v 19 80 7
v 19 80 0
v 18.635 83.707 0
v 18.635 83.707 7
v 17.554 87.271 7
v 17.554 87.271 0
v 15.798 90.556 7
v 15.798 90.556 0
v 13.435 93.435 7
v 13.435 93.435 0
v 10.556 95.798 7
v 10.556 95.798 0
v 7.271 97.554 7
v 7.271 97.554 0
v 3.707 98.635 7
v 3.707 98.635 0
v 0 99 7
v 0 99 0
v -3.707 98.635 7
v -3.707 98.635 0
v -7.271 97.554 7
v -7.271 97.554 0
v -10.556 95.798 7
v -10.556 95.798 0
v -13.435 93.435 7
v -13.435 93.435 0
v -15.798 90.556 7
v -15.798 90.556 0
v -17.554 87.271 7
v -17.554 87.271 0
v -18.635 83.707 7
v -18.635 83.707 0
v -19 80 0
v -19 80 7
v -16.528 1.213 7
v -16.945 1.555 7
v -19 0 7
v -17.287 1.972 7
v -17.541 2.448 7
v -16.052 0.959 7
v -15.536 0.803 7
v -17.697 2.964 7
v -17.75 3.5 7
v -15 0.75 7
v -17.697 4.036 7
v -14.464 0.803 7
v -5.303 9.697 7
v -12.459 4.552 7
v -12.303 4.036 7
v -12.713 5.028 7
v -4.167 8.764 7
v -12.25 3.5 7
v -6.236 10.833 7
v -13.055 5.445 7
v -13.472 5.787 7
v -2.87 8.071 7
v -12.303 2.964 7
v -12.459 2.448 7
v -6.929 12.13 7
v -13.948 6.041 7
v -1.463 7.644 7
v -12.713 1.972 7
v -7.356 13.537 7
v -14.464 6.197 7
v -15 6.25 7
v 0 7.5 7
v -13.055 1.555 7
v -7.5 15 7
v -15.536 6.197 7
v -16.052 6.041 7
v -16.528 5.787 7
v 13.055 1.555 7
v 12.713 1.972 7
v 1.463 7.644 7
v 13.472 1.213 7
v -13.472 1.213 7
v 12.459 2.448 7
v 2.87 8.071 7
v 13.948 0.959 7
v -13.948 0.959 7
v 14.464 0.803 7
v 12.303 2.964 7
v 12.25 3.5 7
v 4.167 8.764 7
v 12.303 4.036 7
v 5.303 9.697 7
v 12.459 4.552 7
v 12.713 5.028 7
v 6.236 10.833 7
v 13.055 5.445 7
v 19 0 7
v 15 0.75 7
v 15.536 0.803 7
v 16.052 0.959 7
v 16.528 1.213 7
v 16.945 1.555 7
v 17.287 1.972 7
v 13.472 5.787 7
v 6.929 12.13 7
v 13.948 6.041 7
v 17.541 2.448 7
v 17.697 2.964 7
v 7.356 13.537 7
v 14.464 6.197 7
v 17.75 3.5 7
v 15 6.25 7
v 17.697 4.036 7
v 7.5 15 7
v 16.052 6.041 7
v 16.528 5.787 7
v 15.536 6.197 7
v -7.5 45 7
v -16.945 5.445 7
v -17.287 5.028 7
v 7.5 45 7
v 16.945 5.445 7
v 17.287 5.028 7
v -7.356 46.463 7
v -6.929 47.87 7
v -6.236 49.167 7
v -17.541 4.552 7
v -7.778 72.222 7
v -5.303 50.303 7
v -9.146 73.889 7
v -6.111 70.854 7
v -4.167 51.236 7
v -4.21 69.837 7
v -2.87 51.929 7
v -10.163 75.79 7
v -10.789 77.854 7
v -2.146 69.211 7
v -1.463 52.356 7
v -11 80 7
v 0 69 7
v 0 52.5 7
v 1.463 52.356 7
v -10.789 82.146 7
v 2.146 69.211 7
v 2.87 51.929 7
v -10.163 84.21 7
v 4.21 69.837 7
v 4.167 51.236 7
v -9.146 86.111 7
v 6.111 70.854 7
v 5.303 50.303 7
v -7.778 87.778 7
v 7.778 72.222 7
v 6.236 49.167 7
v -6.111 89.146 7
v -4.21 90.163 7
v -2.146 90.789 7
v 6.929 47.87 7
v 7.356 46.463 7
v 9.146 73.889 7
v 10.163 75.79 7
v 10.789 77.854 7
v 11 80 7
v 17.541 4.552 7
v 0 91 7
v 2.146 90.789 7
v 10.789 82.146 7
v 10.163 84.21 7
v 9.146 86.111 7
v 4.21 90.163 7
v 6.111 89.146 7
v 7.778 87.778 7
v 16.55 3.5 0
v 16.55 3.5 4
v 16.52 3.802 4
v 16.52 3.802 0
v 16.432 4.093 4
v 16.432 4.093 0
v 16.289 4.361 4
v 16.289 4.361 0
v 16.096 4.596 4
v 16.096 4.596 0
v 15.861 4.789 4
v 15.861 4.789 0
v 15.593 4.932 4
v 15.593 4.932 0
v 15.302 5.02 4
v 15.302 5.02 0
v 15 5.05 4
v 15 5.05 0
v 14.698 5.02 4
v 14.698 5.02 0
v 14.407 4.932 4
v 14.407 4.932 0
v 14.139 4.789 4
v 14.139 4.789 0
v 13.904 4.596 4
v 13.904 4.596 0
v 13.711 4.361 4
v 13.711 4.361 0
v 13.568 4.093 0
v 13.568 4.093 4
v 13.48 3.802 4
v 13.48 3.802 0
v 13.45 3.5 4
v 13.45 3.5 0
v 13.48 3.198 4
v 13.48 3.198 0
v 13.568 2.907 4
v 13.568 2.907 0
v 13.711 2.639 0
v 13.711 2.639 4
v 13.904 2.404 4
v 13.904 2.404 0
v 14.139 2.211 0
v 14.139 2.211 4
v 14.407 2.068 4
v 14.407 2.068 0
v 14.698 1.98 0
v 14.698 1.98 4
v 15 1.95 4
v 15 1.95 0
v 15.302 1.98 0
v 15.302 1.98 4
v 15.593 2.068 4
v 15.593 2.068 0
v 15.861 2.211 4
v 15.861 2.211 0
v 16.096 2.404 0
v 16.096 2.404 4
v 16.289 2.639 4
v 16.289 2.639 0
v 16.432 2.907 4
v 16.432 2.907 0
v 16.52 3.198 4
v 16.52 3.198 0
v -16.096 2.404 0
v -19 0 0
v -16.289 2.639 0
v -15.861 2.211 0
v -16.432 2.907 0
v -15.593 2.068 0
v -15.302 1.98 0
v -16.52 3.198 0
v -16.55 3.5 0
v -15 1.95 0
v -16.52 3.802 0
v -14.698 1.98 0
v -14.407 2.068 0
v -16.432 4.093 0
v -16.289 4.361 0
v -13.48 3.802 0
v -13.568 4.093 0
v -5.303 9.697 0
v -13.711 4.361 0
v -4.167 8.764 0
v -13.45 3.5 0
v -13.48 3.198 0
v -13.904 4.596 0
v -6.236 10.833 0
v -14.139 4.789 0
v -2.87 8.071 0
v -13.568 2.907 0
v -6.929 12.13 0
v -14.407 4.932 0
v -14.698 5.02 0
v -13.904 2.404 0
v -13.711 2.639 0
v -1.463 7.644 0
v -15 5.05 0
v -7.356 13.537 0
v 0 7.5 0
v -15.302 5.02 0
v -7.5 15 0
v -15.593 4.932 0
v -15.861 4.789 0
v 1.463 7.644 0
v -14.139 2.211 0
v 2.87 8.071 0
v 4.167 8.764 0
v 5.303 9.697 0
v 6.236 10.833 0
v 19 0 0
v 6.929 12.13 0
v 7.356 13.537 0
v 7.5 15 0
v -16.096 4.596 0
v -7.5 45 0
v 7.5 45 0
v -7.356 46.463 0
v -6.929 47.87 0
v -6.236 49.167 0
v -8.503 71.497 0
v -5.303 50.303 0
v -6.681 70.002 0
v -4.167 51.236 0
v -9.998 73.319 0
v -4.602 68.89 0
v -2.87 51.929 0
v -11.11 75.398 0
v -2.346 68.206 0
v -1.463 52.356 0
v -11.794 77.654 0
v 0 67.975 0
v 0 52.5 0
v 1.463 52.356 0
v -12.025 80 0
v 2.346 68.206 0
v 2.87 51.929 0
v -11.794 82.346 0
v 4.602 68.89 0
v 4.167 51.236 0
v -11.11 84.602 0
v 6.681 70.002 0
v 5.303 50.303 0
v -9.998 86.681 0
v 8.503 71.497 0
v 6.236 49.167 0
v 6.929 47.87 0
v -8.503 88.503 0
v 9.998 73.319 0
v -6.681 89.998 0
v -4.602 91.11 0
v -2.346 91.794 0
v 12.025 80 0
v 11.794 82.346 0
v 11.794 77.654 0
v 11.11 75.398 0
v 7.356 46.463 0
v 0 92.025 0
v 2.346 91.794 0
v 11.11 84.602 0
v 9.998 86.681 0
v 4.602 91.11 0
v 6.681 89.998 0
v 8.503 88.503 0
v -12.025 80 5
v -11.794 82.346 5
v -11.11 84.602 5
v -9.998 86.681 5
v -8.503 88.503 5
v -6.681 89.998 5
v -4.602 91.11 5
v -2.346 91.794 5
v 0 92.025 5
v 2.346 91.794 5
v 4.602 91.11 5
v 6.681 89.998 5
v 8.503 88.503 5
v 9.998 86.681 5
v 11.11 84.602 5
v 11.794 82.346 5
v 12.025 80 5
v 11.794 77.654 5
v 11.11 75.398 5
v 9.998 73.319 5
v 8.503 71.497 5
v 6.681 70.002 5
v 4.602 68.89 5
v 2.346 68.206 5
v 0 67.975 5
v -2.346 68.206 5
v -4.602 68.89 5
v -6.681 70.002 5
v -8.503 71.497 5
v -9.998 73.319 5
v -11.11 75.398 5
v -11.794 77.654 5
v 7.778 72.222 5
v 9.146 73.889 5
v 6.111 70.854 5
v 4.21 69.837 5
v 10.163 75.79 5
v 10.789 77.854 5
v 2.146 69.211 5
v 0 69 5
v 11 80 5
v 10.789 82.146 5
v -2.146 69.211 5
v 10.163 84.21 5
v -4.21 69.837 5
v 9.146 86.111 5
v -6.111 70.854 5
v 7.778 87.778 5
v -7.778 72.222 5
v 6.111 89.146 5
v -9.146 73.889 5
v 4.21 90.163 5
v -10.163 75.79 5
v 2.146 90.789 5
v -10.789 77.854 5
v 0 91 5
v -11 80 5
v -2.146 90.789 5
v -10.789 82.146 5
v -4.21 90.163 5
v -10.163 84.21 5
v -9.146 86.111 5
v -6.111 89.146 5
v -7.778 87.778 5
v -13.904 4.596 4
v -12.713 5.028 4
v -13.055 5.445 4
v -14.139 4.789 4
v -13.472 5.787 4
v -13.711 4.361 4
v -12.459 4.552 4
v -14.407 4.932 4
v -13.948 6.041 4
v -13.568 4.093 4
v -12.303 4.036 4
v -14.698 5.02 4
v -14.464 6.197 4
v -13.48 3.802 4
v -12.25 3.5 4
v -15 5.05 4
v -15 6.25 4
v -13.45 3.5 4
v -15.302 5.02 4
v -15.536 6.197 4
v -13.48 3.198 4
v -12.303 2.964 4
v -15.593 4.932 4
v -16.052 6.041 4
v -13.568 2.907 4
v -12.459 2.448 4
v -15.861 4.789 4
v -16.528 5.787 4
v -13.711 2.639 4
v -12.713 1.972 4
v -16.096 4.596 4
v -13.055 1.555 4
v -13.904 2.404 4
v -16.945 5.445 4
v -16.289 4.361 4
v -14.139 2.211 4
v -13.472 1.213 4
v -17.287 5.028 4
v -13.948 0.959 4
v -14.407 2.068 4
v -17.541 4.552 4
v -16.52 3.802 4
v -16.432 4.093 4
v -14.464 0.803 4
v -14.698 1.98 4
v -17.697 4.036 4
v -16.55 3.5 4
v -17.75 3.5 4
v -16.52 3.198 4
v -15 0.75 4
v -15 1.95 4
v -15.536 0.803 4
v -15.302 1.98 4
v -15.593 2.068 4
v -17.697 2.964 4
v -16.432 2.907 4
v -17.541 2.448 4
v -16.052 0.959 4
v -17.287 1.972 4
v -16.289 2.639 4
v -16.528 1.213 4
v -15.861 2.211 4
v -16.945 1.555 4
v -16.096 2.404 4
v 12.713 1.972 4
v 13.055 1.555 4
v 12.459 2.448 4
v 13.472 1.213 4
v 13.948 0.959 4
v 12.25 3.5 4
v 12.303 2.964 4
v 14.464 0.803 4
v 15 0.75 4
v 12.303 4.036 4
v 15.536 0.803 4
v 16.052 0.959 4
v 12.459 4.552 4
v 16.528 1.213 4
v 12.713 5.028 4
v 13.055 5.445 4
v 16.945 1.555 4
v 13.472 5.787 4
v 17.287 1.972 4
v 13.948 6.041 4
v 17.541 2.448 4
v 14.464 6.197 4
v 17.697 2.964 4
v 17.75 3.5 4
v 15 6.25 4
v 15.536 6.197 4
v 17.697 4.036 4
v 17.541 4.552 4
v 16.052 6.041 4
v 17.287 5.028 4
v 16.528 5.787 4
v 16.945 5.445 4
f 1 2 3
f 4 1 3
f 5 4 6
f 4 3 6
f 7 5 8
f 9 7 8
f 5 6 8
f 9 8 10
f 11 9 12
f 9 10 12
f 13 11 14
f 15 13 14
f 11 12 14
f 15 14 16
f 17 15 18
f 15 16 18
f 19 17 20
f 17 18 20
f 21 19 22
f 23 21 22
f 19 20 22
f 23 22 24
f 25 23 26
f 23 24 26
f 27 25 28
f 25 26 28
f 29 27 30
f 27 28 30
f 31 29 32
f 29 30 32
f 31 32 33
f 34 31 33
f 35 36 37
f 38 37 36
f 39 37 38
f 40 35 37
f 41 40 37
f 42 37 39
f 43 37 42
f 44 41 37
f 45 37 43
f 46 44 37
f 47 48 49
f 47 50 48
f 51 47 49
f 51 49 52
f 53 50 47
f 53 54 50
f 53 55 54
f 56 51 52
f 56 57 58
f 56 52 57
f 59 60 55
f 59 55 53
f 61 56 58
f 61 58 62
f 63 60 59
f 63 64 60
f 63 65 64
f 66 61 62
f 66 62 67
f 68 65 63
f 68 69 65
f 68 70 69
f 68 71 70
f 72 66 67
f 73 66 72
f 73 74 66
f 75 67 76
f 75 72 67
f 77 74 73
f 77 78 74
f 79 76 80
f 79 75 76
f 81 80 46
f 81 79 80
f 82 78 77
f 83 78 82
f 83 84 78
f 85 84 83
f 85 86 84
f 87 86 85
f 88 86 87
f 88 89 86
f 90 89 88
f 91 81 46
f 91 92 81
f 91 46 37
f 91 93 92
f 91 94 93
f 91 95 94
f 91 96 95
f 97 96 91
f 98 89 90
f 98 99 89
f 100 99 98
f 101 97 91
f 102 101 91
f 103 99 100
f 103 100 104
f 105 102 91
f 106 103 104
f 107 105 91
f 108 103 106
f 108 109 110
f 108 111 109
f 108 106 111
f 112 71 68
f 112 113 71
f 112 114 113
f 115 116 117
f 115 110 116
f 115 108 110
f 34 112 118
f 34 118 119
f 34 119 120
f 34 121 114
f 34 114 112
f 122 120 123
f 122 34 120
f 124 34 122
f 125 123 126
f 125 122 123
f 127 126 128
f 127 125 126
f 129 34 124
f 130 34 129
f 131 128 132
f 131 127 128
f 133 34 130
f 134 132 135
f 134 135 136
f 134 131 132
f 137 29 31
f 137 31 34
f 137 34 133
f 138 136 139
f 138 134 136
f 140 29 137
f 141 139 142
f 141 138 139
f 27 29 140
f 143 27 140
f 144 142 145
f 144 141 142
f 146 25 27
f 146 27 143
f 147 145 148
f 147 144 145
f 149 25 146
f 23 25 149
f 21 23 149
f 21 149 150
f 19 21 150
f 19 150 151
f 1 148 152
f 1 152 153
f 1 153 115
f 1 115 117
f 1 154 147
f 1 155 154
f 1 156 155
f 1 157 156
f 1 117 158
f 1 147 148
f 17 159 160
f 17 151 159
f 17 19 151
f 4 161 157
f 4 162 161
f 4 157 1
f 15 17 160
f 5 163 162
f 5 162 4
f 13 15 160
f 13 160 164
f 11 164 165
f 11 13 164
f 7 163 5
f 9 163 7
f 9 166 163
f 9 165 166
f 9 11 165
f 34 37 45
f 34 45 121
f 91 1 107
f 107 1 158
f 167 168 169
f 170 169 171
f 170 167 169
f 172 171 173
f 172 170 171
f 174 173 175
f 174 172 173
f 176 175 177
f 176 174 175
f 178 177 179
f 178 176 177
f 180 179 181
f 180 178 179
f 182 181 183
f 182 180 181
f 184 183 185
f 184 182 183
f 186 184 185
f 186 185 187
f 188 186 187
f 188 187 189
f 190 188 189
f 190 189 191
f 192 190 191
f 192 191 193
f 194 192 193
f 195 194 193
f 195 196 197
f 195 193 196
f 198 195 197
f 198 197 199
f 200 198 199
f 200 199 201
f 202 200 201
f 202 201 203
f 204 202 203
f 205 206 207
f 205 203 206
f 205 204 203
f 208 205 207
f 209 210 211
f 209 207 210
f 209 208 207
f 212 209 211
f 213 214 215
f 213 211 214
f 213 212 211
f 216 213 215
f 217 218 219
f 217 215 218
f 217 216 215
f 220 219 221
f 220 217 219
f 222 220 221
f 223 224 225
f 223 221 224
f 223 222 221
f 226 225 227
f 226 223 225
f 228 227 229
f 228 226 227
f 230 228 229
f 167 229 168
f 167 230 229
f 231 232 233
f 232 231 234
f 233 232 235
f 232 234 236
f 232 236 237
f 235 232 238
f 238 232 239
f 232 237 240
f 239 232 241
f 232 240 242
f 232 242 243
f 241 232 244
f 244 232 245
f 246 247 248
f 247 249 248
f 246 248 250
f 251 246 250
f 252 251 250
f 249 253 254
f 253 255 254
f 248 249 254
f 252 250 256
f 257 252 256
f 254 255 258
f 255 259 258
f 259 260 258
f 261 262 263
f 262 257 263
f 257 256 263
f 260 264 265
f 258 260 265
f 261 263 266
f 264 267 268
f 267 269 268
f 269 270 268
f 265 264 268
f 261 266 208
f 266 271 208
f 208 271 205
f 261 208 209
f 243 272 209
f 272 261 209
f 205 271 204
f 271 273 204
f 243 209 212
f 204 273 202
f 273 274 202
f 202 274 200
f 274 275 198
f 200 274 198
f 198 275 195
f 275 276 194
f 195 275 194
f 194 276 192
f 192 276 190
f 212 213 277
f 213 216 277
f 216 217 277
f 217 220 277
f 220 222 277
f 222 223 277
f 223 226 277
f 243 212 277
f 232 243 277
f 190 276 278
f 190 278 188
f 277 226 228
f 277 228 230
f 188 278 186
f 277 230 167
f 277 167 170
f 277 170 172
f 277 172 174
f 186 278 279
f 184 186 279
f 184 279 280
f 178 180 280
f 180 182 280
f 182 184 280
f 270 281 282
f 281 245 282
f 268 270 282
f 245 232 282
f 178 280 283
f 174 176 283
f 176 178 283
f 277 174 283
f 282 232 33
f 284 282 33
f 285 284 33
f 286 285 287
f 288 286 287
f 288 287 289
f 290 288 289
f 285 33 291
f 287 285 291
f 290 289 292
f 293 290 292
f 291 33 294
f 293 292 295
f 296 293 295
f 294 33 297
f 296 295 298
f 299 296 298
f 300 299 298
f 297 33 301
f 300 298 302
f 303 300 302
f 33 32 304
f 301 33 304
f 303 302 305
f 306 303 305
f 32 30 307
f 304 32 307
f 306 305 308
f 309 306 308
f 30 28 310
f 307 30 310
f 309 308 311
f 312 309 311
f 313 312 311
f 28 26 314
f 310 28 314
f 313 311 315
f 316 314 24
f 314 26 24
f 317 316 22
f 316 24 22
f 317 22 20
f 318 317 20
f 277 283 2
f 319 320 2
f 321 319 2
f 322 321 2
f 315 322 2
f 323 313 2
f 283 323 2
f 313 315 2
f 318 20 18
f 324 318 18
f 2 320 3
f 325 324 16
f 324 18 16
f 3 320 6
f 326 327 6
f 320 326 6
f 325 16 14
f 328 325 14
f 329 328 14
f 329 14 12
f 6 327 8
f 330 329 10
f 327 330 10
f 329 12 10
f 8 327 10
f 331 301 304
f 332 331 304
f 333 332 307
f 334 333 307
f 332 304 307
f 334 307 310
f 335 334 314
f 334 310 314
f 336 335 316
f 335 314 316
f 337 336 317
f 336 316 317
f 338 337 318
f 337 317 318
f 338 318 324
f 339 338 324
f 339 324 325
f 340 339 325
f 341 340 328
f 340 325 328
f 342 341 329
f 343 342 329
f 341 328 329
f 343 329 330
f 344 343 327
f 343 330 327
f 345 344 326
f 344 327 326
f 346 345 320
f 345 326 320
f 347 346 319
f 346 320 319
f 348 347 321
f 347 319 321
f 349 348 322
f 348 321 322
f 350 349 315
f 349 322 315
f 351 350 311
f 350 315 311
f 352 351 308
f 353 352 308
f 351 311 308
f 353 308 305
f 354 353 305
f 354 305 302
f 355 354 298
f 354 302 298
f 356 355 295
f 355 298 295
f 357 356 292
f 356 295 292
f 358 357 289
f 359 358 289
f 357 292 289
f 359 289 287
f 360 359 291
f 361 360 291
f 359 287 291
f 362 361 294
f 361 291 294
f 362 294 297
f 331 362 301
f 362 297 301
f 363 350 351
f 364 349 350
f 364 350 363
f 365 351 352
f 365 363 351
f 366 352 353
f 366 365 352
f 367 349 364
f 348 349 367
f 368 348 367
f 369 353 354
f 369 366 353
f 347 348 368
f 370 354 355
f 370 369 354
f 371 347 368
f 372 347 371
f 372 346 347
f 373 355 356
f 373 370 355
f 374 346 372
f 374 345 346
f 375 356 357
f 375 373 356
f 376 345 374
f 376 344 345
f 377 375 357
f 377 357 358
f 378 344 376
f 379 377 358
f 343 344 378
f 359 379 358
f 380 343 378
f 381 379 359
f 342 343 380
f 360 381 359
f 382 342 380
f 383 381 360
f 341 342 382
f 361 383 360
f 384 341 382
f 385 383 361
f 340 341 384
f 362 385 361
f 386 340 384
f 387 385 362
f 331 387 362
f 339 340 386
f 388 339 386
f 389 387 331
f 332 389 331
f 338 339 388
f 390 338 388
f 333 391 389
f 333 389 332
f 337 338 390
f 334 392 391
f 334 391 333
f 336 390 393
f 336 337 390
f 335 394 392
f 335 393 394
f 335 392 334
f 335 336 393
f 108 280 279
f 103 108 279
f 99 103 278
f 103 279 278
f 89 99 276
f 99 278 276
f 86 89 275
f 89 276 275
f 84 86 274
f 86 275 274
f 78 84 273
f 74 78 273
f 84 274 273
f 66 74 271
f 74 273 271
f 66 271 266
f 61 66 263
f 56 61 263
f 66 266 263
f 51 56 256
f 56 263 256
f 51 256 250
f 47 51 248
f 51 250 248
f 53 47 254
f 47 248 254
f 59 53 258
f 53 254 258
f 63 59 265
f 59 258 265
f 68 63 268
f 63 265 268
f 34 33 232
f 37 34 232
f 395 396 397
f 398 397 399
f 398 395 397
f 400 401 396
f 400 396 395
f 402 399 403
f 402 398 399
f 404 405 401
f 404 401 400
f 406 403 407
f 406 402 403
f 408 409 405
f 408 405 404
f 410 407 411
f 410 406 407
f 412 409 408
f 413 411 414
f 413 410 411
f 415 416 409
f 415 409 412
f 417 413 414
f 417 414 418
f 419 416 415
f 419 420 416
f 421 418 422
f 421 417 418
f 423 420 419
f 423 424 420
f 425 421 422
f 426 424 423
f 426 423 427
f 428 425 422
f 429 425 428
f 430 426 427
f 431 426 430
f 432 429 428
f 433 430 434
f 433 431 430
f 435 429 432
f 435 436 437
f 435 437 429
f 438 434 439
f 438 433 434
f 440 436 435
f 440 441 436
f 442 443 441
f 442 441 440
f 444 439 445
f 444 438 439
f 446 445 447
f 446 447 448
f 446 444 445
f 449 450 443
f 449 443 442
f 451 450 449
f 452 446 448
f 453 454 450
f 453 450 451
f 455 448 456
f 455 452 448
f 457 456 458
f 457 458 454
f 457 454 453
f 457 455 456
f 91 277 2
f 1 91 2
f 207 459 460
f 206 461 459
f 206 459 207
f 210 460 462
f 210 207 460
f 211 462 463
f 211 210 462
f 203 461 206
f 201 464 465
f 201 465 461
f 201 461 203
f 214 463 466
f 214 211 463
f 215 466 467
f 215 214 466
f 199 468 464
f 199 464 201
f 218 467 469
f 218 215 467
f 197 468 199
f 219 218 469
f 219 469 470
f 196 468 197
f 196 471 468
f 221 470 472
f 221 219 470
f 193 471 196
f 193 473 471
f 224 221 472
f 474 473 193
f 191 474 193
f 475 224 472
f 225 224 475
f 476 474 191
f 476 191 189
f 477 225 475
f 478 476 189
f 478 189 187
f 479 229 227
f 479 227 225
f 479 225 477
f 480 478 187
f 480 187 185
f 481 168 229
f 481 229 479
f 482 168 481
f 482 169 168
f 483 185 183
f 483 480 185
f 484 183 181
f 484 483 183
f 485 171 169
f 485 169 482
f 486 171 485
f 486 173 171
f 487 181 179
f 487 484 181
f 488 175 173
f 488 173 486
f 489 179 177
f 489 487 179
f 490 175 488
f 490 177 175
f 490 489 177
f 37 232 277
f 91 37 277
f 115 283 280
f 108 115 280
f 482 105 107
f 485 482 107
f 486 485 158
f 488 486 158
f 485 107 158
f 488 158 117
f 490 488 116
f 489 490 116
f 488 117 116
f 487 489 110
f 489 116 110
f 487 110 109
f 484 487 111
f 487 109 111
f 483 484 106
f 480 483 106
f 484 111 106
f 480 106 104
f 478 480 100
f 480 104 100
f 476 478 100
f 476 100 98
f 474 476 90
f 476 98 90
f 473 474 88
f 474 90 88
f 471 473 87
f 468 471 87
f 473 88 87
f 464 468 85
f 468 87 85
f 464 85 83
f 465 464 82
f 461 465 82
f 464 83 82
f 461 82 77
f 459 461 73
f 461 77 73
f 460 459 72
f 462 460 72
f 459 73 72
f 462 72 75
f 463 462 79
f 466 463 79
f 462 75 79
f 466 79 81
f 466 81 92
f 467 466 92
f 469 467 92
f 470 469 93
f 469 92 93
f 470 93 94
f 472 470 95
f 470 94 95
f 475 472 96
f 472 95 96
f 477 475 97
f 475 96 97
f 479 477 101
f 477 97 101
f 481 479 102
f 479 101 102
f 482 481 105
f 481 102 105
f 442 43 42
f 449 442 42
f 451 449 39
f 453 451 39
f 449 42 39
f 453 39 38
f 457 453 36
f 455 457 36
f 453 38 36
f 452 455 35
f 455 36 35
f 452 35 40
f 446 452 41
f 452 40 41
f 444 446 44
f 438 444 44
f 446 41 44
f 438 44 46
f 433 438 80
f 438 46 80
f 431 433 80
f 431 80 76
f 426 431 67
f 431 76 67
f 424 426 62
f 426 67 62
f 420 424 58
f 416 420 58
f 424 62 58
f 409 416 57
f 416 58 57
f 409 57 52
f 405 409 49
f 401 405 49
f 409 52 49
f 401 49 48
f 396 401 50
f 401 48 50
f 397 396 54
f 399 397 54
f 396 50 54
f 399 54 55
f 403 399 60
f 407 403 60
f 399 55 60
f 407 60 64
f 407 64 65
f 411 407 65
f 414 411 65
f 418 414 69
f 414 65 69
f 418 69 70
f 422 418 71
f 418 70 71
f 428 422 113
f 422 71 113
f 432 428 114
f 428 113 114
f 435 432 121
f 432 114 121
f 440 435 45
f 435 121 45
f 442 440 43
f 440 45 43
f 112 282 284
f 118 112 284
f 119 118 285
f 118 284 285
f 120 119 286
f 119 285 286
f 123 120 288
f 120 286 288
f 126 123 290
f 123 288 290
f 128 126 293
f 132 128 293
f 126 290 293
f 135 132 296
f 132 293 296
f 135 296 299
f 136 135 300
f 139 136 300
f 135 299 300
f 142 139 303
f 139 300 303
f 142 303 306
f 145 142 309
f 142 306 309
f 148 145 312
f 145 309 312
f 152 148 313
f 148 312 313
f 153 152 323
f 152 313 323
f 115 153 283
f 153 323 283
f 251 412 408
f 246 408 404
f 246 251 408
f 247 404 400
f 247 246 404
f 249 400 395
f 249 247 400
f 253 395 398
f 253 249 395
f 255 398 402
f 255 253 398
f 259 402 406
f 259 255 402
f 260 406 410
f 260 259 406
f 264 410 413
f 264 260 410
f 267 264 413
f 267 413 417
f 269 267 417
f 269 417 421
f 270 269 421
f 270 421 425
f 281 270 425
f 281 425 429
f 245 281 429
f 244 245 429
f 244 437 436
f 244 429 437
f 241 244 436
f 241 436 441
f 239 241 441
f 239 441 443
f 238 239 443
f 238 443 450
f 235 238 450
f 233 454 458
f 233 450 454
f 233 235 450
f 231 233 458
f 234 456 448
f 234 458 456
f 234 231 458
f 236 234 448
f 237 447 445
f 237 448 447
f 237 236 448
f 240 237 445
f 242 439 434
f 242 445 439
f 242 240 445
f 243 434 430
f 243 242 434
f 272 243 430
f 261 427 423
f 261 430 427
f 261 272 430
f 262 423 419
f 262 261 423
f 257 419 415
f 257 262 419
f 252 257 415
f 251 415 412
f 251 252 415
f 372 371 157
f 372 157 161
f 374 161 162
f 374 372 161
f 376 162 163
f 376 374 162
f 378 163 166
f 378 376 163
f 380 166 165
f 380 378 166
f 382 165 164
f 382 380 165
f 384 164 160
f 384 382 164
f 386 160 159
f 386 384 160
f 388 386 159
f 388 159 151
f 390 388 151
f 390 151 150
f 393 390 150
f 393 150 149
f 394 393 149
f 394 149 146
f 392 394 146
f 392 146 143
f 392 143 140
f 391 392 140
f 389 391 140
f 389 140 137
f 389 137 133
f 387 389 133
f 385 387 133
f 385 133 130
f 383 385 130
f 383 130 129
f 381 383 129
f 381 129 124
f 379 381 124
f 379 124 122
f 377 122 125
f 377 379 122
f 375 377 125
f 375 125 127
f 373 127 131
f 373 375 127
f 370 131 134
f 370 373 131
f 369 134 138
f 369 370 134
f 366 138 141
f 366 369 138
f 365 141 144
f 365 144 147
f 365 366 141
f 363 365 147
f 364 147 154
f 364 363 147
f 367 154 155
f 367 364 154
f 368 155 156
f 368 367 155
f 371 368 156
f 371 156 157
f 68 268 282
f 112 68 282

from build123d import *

# Parameters (mm, degrees)
SKETCH_1_R         = 11
SKETCH_1_R_2       = 1.55
SKETCH_1_R_3       = 19
EXTRUDE_1_DEPTH    = 7
SKETCH1_R          = 2.75
CUT_EXTRUDE1_DEPTH = 3
SKETCH2_R          = 12.025
CUT_EXTRUDE2_DEPTH = 5


with BuildPart() as part:
    # 草图1 → 凸台-拉伸1 (new body)
    # profile 1 of 3: a face of its own
    with BuildSketch(Plane.XY):
        with BuildLine():
            ThreePointArc((19, 80), (0, 99), (-19, 80))
            ThreePointArc((-19, 80), (0, 61), (19, 80))
        make_face()
        with Locations((0, 80)):
            Circle(SKETCH_1_R, mode=Mode.SUBTRACT)
    # profile 2 of 3: a face of its own
    with BuildSketch(Plane.XY):
        with BuildLine():
            Line((-19, 7), (-19, 0))
            Line((-19, 0), (19, 0))
            Line((19, 0), (19, 7))
            Line((19, 7), (19, 80))
            ThreePointArc((19, 80), (0, 61), (-19, 80))
            Line((-19, 80), (-19, 7))
        make_face()
        with Locations((-15, 3.5)):
            Circle(SKETCH_1_R_2, mode=Mode.SUBTRACT)
        with BuildLine():
            ThreePointArc((-7.5, 45), (0, 52.5), (7.5, 45))
            Line((7.5, 45), (7.5, 15))
            ThreePointArc((7.5, 15), (0, 7.5), (-7.5, 15))
            Line((-7.5, 15), (-7.5, 45))
        make_face(mode=Mode.SUBTRACT)
        with Locations((15, 3.5)):
            Circle(SKETCH_1_R_2, mode=Mode.SUBTRACT)
    # profile 3 of 3: a face of its own
    with BuildSketch(Plane.XY):
        with Locations((0, 80)):
            Circle(SKETCH_1_R_3)
        with Locations((0, 80)):
            Circle(SKETCH_1_R, mode=Mode.SUBTRACT)
    extrude(amount=EXTRUDE_1_DEPTH)

    # Sketch1 → Cut-Extrude1 (cut)
    with BuildSketch(Plane.XY.offset(7)):
        with Locations((15, 3.5)):
            Circle(SKETCH1_R)
        with Locations(Location((-15, 3.5, 0), (0, 0, 180))):
            Circle(SKETCH1_R)
    extrude(amount=-CUT_EXTRUDE1_DEPTH, mode=Mode.SUBTRACT)

    # Sketch2 → Cut-Extrude2 (cut)
    with BuildSketch(Plane(origin=(0, 0, 0), x_dir=(-1, 0, 0), z_dir=(0, 0, -1))):
        with Locations((0, 80)):
            Circle(SKETCH2_R)
    extrude(amount=-CUT_EXTRUDE2_DEPTH, mode=Mode.SUBTRACT)


solid = part.part
